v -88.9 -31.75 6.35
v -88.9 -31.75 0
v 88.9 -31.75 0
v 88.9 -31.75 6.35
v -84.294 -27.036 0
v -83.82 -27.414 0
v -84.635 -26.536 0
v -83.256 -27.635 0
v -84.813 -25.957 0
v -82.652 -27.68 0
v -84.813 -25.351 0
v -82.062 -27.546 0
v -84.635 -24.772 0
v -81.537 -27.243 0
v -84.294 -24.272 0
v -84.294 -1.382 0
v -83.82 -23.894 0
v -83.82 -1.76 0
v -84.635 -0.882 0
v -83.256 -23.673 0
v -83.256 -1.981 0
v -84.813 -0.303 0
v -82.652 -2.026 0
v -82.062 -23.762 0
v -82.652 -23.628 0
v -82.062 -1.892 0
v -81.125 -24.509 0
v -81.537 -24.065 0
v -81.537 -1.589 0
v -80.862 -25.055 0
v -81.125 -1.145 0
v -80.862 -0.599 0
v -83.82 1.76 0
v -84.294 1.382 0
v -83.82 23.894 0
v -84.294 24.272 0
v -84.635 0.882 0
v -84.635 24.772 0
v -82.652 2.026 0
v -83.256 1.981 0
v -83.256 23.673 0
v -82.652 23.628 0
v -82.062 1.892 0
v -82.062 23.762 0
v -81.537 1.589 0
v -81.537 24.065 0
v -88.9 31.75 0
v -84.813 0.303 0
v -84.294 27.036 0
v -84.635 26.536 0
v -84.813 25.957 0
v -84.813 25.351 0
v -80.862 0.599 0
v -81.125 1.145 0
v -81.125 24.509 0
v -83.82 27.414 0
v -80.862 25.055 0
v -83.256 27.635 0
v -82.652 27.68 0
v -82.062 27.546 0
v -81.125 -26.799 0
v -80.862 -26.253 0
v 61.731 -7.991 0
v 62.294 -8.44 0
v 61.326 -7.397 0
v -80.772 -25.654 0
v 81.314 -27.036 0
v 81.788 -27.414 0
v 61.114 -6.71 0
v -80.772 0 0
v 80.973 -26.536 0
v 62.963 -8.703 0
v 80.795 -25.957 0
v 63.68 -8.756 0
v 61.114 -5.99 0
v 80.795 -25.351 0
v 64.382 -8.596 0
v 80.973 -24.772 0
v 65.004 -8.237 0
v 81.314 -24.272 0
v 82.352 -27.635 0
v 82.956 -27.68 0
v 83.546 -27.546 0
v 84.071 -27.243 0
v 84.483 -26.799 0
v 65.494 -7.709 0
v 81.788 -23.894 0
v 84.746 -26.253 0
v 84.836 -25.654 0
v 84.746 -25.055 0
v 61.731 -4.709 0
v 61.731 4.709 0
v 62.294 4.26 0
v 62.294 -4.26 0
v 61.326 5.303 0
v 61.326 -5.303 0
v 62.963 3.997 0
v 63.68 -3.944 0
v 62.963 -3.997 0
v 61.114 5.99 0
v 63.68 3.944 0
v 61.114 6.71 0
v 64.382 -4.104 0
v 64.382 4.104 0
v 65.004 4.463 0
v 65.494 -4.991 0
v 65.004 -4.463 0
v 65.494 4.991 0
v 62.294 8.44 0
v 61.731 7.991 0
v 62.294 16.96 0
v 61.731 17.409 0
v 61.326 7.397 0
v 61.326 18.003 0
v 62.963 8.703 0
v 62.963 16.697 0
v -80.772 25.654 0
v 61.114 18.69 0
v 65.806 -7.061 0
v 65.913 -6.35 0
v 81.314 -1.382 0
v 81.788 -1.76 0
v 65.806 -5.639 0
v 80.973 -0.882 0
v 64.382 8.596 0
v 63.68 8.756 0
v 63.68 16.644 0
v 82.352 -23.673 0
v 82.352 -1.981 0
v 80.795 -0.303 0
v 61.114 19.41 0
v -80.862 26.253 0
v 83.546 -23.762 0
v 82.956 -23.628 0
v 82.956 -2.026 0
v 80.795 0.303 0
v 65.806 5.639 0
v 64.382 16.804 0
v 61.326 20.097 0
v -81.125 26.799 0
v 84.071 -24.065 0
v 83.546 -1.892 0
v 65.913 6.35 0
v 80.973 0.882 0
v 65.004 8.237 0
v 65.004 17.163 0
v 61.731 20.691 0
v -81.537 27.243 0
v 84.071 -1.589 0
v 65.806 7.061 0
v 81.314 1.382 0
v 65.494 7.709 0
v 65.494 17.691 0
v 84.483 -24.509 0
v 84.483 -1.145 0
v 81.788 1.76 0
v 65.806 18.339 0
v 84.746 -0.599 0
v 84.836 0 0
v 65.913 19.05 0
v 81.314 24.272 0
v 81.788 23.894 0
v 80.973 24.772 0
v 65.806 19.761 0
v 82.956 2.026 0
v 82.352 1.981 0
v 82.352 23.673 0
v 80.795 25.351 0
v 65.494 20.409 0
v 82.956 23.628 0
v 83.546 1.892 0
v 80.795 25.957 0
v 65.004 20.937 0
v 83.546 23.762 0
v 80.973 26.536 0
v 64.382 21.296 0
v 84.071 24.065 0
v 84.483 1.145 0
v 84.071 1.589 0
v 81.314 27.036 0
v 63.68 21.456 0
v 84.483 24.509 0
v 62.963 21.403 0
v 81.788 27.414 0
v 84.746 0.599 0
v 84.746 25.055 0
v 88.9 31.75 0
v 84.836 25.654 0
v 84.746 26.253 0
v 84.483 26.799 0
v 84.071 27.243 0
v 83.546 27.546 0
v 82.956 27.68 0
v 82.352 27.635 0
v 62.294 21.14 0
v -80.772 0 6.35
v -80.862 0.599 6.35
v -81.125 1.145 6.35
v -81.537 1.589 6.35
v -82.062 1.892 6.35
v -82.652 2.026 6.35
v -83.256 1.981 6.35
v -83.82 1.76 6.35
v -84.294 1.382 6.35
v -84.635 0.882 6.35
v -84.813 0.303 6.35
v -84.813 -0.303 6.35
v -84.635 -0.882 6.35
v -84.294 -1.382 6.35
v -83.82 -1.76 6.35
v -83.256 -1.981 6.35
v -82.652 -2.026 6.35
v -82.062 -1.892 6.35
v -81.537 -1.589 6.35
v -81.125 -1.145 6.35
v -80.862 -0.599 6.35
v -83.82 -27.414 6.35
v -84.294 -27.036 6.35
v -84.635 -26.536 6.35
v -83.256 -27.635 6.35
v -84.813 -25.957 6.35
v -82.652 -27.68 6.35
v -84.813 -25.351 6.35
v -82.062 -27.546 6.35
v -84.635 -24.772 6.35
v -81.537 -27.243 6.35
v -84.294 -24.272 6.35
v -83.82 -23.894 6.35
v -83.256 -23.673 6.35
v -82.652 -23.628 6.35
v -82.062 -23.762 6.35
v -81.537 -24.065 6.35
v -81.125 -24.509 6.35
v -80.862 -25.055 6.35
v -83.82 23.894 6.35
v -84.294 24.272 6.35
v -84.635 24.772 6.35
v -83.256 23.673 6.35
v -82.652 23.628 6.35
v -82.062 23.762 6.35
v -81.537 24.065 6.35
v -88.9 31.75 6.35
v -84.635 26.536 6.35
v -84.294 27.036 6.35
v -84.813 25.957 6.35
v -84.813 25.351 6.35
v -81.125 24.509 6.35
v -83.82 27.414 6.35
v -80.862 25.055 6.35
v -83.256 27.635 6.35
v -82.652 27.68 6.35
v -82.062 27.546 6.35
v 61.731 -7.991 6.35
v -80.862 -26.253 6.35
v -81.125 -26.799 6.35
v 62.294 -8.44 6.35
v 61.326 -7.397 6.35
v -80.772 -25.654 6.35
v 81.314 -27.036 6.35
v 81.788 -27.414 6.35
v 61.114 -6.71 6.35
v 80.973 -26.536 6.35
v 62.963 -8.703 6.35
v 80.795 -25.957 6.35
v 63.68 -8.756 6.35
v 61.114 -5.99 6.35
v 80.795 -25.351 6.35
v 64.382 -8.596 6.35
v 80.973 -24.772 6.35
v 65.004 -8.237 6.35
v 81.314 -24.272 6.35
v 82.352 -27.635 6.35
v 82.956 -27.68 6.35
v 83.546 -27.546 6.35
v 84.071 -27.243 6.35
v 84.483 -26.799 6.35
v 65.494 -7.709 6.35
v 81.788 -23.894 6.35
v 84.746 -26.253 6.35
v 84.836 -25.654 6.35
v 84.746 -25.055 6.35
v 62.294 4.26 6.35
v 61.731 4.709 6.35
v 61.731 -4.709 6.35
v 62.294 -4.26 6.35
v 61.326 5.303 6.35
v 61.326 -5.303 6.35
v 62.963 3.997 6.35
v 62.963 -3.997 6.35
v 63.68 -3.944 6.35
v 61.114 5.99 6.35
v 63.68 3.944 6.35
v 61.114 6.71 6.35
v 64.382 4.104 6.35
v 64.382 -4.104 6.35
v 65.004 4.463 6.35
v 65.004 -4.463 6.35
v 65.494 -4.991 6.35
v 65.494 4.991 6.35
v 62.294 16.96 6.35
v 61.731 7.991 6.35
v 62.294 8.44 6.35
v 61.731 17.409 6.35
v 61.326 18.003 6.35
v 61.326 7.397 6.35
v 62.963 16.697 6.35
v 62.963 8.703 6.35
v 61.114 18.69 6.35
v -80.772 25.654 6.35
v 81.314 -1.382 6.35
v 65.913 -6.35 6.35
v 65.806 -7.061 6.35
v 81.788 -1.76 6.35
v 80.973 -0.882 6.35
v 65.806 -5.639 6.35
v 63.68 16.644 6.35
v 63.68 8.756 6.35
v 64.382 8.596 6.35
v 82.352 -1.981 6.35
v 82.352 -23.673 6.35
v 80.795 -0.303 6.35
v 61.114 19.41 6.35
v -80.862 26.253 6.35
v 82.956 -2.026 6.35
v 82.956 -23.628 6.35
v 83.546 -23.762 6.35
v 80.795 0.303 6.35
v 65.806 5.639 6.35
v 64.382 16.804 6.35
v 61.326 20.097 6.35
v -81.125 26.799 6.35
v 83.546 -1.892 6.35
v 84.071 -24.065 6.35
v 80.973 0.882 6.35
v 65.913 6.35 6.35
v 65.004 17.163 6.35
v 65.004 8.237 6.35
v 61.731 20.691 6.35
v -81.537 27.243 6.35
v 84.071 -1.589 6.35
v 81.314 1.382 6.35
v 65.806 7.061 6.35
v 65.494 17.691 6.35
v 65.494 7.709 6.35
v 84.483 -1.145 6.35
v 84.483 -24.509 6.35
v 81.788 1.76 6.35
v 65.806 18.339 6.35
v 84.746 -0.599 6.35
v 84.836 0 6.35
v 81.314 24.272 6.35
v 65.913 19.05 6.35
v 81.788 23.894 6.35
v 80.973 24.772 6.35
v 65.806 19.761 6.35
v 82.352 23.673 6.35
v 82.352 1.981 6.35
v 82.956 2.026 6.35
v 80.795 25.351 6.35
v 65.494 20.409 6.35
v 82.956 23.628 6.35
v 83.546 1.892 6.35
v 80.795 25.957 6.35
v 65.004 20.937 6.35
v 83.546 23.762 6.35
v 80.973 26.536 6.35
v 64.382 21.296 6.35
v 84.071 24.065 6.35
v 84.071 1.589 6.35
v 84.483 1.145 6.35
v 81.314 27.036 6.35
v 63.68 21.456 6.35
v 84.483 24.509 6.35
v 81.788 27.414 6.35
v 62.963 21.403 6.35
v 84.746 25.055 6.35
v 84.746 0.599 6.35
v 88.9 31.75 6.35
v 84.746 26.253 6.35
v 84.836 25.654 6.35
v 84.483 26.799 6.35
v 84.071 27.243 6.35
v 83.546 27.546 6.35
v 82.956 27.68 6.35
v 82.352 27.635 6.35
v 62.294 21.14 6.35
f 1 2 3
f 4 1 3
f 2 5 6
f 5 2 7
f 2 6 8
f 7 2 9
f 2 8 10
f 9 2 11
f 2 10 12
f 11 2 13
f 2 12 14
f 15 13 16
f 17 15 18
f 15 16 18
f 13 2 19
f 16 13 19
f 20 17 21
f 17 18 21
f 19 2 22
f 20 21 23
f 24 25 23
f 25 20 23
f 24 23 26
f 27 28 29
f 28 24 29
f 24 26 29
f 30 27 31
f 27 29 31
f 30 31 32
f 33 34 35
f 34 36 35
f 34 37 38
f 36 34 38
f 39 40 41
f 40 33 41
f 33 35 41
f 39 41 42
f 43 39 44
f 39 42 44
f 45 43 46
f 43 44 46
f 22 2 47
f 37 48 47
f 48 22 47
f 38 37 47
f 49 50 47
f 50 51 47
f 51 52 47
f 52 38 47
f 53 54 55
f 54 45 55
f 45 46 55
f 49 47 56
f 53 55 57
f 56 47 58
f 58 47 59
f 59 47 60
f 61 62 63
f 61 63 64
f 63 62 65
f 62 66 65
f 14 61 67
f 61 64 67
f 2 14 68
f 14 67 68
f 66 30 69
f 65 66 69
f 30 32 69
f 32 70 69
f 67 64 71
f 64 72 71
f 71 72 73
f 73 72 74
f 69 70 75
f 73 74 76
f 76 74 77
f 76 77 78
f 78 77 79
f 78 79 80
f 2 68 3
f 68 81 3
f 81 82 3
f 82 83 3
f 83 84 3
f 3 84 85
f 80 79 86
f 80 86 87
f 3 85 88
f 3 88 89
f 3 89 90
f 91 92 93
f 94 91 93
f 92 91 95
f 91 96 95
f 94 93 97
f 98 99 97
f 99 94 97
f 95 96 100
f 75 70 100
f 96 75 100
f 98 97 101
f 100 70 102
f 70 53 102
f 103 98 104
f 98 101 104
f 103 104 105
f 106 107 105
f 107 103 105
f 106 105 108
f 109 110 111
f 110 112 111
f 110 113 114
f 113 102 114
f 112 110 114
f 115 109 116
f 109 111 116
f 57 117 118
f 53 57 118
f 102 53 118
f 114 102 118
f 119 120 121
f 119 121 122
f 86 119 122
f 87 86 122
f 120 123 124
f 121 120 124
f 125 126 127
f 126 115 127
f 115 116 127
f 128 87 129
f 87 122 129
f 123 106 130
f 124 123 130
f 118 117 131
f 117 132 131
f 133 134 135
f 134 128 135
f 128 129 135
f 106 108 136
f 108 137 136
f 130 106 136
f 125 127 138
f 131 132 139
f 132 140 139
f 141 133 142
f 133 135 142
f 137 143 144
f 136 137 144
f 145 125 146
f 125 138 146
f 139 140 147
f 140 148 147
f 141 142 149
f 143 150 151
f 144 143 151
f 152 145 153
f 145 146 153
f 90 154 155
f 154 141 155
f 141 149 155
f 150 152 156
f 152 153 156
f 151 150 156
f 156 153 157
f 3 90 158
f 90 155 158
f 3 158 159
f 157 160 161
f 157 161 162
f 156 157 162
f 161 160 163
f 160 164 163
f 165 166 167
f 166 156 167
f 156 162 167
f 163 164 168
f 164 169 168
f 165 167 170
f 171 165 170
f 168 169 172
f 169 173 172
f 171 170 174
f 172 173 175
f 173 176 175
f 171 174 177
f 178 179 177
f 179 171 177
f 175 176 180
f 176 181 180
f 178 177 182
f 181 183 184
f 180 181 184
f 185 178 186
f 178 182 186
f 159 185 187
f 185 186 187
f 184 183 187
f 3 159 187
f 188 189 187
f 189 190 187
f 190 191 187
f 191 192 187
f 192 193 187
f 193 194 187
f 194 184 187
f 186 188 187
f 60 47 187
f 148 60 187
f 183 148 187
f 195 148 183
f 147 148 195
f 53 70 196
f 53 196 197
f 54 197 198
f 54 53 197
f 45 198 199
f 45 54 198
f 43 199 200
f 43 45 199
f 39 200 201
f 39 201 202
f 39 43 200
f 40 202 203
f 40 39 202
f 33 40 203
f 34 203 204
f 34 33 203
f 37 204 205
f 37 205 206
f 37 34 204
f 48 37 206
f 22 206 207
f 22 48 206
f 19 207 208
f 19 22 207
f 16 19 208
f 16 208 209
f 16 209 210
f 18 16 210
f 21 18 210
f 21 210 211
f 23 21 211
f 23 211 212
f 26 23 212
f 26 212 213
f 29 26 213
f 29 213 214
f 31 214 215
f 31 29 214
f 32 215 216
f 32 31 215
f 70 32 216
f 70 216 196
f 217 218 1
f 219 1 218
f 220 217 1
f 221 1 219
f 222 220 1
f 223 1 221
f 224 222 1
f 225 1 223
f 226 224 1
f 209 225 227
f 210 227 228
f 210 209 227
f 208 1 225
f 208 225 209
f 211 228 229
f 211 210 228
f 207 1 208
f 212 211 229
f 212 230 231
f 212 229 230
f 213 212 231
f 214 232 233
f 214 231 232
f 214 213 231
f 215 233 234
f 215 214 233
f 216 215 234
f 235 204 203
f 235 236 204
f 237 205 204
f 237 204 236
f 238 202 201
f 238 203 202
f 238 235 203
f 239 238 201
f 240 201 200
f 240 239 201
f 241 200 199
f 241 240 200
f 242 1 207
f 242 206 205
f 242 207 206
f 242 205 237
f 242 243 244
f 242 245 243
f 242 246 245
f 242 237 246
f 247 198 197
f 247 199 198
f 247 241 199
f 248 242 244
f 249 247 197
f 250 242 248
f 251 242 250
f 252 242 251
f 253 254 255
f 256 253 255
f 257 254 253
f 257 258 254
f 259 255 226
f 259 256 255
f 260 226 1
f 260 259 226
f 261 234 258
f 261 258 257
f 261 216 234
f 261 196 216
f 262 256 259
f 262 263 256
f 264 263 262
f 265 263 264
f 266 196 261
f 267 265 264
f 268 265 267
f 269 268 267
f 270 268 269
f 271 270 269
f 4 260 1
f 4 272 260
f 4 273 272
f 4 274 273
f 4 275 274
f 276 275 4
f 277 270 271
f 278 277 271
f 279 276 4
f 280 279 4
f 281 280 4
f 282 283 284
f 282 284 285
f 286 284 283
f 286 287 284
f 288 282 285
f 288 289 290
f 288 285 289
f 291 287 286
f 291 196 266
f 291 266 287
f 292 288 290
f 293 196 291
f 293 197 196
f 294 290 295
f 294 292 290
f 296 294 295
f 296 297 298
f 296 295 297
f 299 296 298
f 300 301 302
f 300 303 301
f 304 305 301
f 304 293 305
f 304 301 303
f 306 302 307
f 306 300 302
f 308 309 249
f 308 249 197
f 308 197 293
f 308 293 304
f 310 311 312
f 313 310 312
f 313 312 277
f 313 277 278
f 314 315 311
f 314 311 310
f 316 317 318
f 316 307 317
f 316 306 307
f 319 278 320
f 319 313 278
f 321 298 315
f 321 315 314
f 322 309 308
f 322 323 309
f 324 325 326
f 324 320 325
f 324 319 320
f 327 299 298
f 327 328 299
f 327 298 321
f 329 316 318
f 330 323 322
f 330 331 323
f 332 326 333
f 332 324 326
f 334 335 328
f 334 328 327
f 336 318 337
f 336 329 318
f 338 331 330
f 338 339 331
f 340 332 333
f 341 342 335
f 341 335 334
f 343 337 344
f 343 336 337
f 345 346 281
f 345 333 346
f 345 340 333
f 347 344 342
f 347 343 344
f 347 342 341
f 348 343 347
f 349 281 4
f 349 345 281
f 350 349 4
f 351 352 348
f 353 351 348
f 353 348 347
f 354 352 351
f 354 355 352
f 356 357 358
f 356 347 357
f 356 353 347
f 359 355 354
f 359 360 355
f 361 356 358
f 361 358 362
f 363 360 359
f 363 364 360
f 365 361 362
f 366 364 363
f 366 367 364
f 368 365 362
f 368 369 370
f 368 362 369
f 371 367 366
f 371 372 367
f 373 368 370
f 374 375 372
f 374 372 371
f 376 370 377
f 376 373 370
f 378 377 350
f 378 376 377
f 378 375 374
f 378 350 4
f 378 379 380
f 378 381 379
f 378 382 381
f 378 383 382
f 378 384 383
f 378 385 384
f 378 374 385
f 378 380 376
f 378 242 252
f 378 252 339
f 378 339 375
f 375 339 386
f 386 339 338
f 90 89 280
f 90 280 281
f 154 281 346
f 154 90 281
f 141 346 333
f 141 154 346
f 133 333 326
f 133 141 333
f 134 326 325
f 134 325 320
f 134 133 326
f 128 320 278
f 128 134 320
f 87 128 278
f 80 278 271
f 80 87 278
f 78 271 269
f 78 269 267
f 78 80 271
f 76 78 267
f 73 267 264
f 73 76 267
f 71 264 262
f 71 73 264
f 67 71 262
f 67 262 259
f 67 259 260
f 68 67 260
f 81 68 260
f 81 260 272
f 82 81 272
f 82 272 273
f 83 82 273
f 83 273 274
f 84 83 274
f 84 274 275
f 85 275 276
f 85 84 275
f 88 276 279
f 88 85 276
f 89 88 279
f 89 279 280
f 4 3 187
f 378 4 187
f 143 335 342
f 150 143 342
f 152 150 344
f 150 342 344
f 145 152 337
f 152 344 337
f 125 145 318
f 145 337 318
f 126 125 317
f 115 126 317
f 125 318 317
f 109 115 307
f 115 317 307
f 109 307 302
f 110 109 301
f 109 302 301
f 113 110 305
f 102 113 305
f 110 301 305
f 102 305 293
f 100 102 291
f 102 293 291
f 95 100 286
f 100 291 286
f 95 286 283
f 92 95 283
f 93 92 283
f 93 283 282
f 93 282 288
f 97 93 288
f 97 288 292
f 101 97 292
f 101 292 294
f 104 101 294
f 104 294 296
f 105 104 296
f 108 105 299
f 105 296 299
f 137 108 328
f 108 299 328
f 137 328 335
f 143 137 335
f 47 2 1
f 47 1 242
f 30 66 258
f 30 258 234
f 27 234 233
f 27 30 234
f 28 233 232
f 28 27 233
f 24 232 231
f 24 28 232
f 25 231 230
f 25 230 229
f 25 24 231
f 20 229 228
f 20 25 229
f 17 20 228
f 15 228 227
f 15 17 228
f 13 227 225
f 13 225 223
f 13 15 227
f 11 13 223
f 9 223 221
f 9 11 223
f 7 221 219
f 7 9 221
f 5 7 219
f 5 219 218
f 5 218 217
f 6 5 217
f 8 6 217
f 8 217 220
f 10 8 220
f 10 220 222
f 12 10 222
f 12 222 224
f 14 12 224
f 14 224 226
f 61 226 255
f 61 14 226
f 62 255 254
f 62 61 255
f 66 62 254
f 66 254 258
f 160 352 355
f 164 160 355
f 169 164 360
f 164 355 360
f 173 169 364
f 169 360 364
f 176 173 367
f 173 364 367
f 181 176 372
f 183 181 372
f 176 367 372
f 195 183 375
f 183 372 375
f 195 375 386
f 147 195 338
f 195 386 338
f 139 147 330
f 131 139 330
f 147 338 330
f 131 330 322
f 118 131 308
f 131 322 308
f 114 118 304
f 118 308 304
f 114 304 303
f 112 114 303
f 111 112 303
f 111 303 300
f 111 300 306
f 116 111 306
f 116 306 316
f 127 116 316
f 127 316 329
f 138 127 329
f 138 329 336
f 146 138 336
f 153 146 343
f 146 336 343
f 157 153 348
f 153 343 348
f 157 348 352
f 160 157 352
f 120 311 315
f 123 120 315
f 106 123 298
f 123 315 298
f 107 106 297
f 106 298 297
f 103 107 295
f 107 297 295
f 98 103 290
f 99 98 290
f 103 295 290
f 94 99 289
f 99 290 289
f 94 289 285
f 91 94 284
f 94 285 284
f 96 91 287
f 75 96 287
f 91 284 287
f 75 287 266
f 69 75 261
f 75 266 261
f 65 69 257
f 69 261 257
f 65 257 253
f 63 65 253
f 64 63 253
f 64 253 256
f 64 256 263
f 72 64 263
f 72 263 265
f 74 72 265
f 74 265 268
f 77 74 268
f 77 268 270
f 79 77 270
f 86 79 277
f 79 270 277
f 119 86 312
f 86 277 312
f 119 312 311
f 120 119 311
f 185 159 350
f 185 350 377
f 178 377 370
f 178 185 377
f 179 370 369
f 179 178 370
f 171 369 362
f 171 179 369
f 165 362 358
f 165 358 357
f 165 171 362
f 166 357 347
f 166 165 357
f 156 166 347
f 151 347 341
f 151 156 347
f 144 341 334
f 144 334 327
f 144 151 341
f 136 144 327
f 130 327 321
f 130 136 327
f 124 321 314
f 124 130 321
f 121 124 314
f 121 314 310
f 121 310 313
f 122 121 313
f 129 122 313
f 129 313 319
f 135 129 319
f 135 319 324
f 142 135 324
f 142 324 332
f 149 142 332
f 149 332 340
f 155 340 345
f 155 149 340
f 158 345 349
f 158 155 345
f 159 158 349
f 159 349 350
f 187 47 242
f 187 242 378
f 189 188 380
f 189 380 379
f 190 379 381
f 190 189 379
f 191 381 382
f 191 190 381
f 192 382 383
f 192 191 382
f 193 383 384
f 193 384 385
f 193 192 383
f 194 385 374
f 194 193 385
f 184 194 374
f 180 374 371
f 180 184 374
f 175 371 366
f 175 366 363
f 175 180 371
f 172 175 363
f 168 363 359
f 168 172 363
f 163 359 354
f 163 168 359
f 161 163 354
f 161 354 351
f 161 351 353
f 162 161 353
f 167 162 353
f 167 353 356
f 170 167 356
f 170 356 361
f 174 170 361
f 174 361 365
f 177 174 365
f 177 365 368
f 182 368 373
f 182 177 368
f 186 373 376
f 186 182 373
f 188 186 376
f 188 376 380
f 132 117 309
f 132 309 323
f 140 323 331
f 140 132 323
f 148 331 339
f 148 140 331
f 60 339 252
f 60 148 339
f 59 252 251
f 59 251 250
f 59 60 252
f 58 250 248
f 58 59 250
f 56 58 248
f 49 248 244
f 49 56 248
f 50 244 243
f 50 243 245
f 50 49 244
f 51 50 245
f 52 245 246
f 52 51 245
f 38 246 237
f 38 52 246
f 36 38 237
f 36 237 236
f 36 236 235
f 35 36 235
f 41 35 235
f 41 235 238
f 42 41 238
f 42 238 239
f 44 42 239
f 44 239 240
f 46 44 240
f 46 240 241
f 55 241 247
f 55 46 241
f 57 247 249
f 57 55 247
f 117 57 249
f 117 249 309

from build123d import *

# Parameters (mm, degrees)
SKETCH1_W           = 177.8
SKETCH1_H           = 63.5
SKETCH1_R           = 2.032
BOSS_EXTRUDE1_DEPTH = 6.35
SKETCH2_R           = 2.413
CUT_EXTRUDE1_DEPTH  = 6.35
LPATTERN1_COUNT     = 3
LPATTERN1_PITCH     = 12.7


with BuildPart() as part:
    # Sketch1 → Boss-Extrude1 (new body)
    with BuildSketch(Plane.XY):
        Rectangle(SKETCH1_W, SKETCH1_H)
        with Locations((-82.804, 25.654)):
            Circle(SKETCH1_R, mode=Mode.SUBTRACT)
        with Locations((-82.804, 0)):
            Circle(SKETCH1_R, mode=Mode.SUBTRACT)
        with Locations((-82.804, -25.654)):
            Circle(SKETCH1_R, mode=Mode.SUBTRACT)
        with Locations((82.804, -25.654)):
            Circle(SKETCH1_R, mode=Mode.SUBTRACT)
        with Locations((82.804, 0)):
            Circle(SKETCH1_R, mode=Mode.SUBTRACT)
        with Locations((82.804, 25.654)):
            Circle(SKETCH1_R, mode=Mode.SUBTRACT)
    extrude(amount=BOSS_EXTRUDE1_DEPTH)

    # Sketch2 → Cut-Extrude1 (cut)
    with BuildSketch(Plane.XY.offset(6.35)):
        with Locations((63.5, 19.05)):
            Circle(SKETCH2_R)
    cut_extrude1 = extrude(amount=-CUT_EXTRUDE1_DEPTH, mode=Mode.SUBTRACT)

    # LPattern1: Cut-Extrude1 ×3
    with Locations(*[(0, -i * LPATTERN1_PITCH, 0) for i in range(1, LPATTERN1_COUNT)]):
        add(cut_extrude1, mode=Mode.SUBTRACT)


solid = part.part
